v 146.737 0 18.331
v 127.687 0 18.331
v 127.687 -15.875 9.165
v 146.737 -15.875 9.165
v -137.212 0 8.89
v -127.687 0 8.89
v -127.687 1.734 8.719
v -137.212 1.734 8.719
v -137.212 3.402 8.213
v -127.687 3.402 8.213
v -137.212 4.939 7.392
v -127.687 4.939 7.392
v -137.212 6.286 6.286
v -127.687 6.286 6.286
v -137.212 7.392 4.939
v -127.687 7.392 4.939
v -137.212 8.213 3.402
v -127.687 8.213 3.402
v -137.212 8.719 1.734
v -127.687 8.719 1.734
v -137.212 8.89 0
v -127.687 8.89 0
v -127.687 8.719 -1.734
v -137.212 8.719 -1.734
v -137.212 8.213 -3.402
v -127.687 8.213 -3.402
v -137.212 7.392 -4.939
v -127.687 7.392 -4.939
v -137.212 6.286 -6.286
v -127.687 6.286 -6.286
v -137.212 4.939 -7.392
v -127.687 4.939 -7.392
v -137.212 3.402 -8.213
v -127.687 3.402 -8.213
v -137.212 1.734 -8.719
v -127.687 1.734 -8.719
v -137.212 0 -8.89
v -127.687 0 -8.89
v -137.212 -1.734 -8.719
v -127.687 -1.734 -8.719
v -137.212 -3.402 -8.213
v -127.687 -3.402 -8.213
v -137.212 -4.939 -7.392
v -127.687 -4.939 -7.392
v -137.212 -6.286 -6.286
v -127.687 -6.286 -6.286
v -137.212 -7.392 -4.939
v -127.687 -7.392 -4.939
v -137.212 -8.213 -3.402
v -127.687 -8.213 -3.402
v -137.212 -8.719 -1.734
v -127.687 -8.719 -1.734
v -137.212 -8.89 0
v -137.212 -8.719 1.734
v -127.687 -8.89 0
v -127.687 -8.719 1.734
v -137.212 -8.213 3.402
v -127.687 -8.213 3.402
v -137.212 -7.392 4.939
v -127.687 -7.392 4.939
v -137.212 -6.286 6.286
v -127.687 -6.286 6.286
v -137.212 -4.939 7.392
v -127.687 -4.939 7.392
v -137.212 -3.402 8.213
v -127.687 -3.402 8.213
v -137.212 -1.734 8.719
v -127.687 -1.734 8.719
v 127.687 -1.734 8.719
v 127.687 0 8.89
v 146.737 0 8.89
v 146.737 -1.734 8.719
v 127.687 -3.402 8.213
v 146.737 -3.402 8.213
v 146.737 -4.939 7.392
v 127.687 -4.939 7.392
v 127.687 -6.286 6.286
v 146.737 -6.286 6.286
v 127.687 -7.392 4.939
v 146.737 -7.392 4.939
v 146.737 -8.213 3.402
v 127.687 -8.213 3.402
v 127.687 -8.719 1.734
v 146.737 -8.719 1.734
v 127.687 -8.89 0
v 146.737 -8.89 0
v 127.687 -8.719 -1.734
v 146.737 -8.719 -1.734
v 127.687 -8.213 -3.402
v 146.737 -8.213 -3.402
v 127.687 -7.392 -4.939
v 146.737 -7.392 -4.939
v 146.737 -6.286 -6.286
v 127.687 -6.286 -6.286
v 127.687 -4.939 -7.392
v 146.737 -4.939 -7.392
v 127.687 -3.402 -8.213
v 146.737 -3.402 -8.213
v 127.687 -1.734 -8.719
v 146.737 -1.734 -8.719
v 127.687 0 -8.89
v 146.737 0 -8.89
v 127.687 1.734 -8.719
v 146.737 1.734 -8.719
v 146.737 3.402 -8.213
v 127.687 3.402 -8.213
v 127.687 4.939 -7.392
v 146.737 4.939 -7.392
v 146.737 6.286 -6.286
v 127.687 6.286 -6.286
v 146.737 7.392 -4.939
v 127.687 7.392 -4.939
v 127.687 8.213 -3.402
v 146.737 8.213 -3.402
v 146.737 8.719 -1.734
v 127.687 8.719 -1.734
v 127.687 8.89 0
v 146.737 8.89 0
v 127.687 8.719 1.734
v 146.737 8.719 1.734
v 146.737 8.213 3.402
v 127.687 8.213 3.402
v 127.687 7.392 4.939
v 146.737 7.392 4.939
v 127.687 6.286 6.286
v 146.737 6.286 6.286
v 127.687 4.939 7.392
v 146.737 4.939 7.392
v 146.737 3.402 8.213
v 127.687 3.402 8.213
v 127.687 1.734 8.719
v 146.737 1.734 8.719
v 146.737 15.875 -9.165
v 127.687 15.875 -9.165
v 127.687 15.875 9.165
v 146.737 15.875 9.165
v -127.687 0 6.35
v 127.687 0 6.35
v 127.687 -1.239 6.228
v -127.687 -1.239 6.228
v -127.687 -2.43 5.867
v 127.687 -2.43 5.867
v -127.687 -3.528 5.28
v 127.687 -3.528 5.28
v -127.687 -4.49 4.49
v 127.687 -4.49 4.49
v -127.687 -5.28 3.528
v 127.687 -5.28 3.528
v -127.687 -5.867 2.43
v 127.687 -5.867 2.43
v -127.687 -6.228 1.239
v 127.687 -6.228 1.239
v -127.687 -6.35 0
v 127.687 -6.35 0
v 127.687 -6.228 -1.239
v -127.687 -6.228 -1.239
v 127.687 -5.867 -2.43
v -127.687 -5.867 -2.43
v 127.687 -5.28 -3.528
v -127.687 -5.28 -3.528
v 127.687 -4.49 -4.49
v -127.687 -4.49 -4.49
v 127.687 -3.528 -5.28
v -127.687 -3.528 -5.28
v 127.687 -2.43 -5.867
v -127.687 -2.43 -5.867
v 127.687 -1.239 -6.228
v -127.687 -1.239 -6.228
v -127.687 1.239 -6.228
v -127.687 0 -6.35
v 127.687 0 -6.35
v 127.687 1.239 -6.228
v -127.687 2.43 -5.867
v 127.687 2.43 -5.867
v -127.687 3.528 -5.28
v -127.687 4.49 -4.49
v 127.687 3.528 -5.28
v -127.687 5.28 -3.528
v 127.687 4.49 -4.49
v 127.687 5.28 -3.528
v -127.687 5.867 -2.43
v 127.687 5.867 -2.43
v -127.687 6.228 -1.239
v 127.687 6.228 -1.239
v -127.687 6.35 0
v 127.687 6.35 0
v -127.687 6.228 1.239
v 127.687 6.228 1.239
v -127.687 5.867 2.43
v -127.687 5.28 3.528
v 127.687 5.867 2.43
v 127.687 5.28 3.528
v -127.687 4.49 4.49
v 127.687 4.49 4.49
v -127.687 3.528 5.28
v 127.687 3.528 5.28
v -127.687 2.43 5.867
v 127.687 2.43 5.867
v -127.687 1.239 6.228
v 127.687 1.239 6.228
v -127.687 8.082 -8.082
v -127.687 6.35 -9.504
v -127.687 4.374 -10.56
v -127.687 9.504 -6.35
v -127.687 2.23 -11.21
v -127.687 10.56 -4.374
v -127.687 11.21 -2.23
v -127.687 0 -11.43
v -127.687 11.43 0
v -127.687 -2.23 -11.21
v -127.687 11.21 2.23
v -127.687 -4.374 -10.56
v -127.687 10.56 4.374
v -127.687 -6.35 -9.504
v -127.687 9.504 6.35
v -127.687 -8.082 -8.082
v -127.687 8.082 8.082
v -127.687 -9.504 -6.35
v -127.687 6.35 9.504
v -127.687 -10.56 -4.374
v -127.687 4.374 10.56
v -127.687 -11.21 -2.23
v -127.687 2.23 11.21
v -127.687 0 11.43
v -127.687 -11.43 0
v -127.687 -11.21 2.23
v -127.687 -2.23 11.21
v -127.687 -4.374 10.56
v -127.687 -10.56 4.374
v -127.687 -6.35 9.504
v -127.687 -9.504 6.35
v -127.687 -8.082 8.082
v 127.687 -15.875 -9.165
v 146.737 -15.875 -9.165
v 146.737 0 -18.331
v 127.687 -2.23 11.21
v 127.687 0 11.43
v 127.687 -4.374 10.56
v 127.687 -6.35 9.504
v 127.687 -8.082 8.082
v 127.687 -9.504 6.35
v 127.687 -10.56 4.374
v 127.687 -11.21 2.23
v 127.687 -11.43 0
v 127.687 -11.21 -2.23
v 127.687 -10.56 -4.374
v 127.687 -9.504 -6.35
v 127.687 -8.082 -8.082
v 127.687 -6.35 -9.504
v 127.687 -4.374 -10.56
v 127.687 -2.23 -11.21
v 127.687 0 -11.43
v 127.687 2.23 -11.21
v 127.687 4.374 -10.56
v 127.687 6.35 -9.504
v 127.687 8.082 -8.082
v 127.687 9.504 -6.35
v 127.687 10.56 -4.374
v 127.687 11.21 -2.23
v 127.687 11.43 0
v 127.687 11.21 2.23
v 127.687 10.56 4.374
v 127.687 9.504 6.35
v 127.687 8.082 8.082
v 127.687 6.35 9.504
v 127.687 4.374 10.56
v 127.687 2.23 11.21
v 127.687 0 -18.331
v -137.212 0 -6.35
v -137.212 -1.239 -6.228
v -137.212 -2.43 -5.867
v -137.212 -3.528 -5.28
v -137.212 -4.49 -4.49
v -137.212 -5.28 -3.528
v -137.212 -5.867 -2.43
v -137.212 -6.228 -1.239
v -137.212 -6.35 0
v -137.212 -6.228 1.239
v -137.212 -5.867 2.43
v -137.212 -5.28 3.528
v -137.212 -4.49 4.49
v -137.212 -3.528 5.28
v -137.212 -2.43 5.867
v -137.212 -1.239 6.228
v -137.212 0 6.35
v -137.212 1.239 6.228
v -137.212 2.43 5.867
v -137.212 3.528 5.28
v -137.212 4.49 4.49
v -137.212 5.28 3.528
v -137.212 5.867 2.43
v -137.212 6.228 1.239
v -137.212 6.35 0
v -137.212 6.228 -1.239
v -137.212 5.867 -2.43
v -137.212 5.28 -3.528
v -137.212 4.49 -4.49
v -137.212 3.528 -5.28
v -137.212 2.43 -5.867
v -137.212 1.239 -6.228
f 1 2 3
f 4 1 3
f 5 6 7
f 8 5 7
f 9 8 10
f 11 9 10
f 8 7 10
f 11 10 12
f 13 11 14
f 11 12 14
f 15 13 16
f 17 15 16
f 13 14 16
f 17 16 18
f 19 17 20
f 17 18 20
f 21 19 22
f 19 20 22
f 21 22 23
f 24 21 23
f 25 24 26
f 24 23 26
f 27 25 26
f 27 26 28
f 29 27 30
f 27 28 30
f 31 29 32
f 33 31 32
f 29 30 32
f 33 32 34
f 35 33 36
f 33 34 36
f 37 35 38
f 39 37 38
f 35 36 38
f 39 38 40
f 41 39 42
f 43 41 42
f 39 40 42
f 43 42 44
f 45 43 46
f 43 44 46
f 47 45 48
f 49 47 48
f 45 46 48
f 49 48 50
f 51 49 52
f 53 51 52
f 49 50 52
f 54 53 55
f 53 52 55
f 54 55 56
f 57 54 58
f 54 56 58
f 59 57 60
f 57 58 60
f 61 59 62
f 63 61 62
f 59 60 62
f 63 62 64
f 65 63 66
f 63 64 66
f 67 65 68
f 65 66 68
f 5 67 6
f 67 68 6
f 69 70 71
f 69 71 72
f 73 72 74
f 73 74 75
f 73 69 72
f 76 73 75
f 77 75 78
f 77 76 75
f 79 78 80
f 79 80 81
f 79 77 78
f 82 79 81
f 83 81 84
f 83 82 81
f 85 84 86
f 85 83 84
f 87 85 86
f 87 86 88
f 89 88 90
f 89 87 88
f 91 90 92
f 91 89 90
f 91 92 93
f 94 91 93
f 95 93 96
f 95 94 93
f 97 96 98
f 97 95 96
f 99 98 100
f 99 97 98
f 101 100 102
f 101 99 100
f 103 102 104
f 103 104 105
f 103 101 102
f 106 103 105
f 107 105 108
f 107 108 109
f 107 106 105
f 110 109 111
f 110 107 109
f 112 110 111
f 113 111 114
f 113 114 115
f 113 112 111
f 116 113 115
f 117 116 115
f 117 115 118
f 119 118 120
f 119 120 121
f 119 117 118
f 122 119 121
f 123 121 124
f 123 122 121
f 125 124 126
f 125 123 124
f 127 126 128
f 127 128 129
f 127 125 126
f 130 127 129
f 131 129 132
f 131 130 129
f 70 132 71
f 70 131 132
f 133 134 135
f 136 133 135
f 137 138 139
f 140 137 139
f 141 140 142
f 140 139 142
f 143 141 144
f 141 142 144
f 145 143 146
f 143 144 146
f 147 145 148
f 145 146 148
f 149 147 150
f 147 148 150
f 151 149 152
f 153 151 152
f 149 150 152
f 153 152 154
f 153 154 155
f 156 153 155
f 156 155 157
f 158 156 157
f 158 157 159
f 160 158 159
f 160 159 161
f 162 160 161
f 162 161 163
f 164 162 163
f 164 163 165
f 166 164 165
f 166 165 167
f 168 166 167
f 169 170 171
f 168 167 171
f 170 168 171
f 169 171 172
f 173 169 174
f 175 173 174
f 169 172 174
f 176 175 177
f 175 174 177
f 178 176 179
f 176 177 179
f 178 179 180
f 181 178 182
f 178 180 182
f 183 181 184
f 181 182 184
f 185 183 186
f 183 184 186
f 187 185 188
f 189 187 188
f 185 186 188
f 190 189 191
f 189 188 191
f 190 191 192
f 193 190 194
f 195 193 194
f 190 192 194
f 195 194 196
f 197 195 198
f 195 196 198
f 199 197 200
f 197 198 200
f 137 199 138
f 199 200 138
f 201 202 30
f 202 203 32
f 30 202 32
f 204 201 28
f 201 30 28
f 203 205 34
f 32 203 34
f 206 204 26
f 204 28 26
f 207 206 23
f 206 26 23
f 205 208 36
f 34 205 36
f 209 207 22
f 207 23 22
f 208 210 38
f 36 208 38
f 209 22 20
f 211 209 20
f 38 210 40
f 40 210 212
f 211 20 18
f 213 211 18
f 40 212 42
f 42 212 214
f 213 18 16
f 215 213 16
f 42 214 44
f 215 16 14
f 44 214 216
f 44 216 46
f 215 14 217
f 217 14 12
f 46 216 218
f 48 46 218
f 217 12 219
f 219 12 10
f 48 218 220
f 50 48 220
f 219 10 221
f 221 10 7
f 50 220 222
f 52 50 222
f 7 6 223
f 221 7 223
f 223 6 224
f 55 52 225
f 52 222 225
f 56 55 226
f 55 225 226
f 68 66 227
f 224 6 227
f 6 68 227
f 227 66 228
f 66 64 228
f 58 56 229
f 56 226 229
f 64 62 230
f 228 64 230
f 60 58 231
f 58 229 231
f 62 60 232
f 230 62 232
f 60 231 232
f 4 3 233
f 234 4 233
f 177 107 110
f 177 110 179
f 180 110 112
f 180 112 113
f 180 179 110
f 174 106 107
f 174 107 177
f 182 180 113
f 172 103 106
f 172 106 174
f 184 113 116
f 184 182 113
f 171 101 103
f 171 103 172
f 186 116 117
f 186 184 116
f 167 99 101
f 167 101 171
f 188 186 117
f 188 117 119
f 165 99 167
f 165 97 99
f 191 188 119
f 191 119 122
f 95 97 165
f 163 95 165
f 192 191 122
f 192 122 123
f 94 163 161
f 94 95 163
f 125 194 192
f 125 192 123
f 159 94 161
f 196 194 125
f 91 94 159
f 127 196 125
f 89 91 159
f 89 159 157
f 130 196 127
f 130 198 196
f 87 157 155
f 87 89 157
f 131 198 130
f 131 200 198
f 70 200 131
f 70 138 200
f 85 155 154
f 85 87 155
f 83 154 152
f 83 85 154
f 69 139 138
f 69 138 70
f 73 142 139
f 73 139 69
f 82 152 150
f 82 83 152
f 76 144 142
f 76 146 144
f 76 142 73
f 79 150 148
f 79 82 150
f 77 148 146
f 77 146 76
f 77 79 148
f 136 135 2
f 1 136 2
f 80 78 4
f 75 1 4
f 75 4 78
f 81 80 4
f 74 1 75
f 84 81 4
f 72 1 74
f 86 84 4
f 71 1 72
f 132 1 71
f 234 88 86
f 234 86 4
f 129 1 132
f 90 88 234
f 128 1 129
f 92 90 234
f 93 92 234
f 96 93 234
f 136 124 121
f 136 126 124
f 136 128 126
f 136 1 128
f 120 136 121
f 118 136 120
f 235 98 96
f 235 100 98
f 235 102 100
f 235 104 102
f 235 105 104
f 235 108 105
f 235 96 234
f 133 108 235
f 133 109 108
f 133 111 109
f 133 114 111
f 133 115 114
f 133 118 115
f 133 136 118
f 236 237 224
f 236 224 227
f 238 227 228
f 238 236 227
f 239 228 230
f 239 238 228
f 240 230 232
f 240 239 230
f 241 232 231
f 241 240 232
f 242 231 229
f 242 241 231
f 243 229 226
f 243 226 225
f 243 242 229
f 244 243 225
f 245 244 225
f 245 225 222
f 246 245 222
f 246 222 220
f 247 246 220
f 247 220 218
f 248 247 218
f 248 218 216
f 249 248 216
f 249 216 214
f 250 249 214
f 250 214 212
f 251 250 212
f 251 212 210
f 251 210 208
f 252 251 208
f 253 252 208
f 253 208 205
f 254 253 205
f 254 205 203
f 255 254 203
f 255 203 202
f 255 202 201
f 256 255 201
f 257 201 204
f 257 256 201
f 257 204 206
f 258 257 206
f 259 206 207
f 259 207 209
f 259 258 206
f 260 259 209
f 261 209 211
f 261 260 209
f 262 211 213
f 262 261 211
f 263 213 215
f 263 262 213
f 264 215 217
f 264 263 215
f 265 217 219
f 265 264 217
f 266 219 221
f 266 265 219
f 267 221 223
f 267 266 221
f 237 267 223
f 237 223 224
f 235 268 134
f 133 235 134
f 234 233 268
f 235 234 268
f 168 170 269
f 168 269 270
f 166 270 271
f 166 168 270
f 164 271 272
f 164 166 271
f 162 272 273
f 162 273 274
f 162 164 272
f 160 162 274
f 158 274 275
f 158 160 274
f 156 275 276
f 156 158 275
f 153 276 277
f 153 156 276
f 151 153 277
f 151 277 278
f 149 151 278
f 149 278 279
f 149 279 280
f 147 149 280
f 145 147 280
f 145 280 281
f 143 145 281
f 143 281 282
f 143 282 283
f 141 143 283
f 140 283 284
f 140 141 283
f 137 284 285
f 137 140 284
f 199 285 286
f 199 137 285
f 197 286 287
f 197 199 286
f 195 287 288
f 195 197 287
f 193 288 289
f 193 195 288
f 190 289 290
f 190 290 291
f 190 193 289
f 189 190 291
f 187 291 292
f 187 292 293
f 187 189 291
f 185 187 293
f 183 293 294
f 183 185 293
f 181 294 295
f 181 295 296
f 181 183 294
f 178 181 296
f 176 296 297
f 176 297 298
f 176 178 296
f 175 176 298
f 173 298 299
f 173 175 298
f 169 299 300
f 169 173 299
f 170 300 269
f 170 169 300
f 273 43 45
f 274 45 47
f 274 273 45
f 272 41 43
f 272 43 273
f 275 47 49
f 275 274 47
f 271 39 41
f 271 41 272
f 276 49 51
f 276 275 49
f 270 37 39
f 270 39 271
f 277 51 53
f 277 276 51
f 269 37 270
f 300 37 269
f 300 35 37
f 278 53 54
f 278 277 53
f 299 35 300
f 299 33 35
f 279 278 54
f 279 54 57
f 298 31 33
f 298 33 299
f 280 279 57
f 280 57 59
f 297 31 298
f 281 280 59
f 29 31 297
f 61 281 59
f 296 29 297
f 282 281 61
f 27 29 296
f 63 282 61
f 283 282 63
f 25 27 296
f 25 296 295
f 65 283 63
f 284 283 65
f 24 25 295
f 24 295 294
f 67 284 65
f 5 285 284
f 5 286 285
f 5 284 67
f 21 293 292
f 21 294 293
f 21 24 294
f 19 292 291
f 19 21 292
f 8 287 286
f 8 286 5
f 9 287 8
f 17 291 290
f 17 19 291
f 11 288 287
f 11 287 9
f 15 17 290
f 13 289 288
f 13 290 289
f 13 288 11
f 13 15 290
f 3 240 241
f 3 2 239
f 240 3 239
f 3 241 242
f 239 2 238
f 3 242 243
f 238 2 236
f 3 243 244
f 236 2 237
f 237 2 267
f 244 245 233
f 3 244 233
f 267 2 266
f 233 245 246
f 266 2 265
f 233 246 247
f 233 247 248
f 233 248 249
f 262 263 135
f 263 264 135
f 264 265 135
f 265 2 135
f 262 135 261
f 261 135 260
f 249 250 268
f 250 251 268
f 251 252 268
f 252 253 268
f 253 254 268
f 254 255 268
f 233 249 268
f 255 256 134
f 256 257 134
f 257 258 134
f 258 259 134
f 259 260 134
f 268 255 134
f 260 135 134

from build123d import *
from build123d.topology import SkipClean

# Parameters (mm, degrees)
SWEEP_THIN1_PROFILE_R   = 11.43
SWEEP_THIN1_PROFILE_R_2 = 6.35
SKETCH14_R              = 8.89
BOSS_EXTRUDE1_DEPTH     = 19.05
SKETCH15_R              = 8.89
SKETCH15_R_2            = 6.35
BOSS_EXTRUDE2_DEPTH     = 9.525


with BuildPart() as part:
    # Sweep-Thin1: sweep along a curve in space
    with BuildLine() as sweep_thin1_path:
        Line((-127.687371879, 0, 0), (127.687371879, 0, 0))
    # Sweep-Thin1 profile (on start of the path) → Sweep-Thin1 (sweep)
    with BuildSketch(Plane(origin=(-127.687371879, 0, 0), x_dir=(0, 0, 1), z_dir=(1, 0, 0))):
        Circle(SWEEP_THIN1_PROFILE_R)
        Circle(SWEEP_THIN1_PROFILE_R_2, mode=Mode.SUBTRACT)
    sweep(path=sweep_thin1_path.line)

    # Sketch14 → Boss-Extrude1 (add)
    with BuildSketch(Plane(origin=(127.687371879, 0, 0), x_dir=(0, 0, -1), z_dir=(1, 0, 0))):
        Polygon((9.165435523, 15.875), (-9.165435523, 15.875), (-18.330871047, 0), (-9.165435523, -15.875), (9.165435523, -15.875), (18.330871047, 0), align=None)
        with Locations(Location((0, 0, 0), (0, 0, 180))):
            Circle(SKETCH14_R, mode=Mode.SUBTRACT)
    extrude(amount=BOSS_EXTRUDE1_DEPTH)

    # Sketch15 → Boss-Extrude2 (add)
    with SkipClean():  # the faces are left unmerged after this step: merging them gives an invalid solid
        with BuildSketch(Plane.ZY.offset(127.687371879)):
            Circle(SKETCH15_R)
            with Locations(Location((0, 0, 0), (0, 0, 180))):
                Circle(SKETCH15_R_2, mode=Mode.SUBTRACT)
        extrude(amount=BOSS_EXTRUDE2_DEPTH)


solid = part.part
